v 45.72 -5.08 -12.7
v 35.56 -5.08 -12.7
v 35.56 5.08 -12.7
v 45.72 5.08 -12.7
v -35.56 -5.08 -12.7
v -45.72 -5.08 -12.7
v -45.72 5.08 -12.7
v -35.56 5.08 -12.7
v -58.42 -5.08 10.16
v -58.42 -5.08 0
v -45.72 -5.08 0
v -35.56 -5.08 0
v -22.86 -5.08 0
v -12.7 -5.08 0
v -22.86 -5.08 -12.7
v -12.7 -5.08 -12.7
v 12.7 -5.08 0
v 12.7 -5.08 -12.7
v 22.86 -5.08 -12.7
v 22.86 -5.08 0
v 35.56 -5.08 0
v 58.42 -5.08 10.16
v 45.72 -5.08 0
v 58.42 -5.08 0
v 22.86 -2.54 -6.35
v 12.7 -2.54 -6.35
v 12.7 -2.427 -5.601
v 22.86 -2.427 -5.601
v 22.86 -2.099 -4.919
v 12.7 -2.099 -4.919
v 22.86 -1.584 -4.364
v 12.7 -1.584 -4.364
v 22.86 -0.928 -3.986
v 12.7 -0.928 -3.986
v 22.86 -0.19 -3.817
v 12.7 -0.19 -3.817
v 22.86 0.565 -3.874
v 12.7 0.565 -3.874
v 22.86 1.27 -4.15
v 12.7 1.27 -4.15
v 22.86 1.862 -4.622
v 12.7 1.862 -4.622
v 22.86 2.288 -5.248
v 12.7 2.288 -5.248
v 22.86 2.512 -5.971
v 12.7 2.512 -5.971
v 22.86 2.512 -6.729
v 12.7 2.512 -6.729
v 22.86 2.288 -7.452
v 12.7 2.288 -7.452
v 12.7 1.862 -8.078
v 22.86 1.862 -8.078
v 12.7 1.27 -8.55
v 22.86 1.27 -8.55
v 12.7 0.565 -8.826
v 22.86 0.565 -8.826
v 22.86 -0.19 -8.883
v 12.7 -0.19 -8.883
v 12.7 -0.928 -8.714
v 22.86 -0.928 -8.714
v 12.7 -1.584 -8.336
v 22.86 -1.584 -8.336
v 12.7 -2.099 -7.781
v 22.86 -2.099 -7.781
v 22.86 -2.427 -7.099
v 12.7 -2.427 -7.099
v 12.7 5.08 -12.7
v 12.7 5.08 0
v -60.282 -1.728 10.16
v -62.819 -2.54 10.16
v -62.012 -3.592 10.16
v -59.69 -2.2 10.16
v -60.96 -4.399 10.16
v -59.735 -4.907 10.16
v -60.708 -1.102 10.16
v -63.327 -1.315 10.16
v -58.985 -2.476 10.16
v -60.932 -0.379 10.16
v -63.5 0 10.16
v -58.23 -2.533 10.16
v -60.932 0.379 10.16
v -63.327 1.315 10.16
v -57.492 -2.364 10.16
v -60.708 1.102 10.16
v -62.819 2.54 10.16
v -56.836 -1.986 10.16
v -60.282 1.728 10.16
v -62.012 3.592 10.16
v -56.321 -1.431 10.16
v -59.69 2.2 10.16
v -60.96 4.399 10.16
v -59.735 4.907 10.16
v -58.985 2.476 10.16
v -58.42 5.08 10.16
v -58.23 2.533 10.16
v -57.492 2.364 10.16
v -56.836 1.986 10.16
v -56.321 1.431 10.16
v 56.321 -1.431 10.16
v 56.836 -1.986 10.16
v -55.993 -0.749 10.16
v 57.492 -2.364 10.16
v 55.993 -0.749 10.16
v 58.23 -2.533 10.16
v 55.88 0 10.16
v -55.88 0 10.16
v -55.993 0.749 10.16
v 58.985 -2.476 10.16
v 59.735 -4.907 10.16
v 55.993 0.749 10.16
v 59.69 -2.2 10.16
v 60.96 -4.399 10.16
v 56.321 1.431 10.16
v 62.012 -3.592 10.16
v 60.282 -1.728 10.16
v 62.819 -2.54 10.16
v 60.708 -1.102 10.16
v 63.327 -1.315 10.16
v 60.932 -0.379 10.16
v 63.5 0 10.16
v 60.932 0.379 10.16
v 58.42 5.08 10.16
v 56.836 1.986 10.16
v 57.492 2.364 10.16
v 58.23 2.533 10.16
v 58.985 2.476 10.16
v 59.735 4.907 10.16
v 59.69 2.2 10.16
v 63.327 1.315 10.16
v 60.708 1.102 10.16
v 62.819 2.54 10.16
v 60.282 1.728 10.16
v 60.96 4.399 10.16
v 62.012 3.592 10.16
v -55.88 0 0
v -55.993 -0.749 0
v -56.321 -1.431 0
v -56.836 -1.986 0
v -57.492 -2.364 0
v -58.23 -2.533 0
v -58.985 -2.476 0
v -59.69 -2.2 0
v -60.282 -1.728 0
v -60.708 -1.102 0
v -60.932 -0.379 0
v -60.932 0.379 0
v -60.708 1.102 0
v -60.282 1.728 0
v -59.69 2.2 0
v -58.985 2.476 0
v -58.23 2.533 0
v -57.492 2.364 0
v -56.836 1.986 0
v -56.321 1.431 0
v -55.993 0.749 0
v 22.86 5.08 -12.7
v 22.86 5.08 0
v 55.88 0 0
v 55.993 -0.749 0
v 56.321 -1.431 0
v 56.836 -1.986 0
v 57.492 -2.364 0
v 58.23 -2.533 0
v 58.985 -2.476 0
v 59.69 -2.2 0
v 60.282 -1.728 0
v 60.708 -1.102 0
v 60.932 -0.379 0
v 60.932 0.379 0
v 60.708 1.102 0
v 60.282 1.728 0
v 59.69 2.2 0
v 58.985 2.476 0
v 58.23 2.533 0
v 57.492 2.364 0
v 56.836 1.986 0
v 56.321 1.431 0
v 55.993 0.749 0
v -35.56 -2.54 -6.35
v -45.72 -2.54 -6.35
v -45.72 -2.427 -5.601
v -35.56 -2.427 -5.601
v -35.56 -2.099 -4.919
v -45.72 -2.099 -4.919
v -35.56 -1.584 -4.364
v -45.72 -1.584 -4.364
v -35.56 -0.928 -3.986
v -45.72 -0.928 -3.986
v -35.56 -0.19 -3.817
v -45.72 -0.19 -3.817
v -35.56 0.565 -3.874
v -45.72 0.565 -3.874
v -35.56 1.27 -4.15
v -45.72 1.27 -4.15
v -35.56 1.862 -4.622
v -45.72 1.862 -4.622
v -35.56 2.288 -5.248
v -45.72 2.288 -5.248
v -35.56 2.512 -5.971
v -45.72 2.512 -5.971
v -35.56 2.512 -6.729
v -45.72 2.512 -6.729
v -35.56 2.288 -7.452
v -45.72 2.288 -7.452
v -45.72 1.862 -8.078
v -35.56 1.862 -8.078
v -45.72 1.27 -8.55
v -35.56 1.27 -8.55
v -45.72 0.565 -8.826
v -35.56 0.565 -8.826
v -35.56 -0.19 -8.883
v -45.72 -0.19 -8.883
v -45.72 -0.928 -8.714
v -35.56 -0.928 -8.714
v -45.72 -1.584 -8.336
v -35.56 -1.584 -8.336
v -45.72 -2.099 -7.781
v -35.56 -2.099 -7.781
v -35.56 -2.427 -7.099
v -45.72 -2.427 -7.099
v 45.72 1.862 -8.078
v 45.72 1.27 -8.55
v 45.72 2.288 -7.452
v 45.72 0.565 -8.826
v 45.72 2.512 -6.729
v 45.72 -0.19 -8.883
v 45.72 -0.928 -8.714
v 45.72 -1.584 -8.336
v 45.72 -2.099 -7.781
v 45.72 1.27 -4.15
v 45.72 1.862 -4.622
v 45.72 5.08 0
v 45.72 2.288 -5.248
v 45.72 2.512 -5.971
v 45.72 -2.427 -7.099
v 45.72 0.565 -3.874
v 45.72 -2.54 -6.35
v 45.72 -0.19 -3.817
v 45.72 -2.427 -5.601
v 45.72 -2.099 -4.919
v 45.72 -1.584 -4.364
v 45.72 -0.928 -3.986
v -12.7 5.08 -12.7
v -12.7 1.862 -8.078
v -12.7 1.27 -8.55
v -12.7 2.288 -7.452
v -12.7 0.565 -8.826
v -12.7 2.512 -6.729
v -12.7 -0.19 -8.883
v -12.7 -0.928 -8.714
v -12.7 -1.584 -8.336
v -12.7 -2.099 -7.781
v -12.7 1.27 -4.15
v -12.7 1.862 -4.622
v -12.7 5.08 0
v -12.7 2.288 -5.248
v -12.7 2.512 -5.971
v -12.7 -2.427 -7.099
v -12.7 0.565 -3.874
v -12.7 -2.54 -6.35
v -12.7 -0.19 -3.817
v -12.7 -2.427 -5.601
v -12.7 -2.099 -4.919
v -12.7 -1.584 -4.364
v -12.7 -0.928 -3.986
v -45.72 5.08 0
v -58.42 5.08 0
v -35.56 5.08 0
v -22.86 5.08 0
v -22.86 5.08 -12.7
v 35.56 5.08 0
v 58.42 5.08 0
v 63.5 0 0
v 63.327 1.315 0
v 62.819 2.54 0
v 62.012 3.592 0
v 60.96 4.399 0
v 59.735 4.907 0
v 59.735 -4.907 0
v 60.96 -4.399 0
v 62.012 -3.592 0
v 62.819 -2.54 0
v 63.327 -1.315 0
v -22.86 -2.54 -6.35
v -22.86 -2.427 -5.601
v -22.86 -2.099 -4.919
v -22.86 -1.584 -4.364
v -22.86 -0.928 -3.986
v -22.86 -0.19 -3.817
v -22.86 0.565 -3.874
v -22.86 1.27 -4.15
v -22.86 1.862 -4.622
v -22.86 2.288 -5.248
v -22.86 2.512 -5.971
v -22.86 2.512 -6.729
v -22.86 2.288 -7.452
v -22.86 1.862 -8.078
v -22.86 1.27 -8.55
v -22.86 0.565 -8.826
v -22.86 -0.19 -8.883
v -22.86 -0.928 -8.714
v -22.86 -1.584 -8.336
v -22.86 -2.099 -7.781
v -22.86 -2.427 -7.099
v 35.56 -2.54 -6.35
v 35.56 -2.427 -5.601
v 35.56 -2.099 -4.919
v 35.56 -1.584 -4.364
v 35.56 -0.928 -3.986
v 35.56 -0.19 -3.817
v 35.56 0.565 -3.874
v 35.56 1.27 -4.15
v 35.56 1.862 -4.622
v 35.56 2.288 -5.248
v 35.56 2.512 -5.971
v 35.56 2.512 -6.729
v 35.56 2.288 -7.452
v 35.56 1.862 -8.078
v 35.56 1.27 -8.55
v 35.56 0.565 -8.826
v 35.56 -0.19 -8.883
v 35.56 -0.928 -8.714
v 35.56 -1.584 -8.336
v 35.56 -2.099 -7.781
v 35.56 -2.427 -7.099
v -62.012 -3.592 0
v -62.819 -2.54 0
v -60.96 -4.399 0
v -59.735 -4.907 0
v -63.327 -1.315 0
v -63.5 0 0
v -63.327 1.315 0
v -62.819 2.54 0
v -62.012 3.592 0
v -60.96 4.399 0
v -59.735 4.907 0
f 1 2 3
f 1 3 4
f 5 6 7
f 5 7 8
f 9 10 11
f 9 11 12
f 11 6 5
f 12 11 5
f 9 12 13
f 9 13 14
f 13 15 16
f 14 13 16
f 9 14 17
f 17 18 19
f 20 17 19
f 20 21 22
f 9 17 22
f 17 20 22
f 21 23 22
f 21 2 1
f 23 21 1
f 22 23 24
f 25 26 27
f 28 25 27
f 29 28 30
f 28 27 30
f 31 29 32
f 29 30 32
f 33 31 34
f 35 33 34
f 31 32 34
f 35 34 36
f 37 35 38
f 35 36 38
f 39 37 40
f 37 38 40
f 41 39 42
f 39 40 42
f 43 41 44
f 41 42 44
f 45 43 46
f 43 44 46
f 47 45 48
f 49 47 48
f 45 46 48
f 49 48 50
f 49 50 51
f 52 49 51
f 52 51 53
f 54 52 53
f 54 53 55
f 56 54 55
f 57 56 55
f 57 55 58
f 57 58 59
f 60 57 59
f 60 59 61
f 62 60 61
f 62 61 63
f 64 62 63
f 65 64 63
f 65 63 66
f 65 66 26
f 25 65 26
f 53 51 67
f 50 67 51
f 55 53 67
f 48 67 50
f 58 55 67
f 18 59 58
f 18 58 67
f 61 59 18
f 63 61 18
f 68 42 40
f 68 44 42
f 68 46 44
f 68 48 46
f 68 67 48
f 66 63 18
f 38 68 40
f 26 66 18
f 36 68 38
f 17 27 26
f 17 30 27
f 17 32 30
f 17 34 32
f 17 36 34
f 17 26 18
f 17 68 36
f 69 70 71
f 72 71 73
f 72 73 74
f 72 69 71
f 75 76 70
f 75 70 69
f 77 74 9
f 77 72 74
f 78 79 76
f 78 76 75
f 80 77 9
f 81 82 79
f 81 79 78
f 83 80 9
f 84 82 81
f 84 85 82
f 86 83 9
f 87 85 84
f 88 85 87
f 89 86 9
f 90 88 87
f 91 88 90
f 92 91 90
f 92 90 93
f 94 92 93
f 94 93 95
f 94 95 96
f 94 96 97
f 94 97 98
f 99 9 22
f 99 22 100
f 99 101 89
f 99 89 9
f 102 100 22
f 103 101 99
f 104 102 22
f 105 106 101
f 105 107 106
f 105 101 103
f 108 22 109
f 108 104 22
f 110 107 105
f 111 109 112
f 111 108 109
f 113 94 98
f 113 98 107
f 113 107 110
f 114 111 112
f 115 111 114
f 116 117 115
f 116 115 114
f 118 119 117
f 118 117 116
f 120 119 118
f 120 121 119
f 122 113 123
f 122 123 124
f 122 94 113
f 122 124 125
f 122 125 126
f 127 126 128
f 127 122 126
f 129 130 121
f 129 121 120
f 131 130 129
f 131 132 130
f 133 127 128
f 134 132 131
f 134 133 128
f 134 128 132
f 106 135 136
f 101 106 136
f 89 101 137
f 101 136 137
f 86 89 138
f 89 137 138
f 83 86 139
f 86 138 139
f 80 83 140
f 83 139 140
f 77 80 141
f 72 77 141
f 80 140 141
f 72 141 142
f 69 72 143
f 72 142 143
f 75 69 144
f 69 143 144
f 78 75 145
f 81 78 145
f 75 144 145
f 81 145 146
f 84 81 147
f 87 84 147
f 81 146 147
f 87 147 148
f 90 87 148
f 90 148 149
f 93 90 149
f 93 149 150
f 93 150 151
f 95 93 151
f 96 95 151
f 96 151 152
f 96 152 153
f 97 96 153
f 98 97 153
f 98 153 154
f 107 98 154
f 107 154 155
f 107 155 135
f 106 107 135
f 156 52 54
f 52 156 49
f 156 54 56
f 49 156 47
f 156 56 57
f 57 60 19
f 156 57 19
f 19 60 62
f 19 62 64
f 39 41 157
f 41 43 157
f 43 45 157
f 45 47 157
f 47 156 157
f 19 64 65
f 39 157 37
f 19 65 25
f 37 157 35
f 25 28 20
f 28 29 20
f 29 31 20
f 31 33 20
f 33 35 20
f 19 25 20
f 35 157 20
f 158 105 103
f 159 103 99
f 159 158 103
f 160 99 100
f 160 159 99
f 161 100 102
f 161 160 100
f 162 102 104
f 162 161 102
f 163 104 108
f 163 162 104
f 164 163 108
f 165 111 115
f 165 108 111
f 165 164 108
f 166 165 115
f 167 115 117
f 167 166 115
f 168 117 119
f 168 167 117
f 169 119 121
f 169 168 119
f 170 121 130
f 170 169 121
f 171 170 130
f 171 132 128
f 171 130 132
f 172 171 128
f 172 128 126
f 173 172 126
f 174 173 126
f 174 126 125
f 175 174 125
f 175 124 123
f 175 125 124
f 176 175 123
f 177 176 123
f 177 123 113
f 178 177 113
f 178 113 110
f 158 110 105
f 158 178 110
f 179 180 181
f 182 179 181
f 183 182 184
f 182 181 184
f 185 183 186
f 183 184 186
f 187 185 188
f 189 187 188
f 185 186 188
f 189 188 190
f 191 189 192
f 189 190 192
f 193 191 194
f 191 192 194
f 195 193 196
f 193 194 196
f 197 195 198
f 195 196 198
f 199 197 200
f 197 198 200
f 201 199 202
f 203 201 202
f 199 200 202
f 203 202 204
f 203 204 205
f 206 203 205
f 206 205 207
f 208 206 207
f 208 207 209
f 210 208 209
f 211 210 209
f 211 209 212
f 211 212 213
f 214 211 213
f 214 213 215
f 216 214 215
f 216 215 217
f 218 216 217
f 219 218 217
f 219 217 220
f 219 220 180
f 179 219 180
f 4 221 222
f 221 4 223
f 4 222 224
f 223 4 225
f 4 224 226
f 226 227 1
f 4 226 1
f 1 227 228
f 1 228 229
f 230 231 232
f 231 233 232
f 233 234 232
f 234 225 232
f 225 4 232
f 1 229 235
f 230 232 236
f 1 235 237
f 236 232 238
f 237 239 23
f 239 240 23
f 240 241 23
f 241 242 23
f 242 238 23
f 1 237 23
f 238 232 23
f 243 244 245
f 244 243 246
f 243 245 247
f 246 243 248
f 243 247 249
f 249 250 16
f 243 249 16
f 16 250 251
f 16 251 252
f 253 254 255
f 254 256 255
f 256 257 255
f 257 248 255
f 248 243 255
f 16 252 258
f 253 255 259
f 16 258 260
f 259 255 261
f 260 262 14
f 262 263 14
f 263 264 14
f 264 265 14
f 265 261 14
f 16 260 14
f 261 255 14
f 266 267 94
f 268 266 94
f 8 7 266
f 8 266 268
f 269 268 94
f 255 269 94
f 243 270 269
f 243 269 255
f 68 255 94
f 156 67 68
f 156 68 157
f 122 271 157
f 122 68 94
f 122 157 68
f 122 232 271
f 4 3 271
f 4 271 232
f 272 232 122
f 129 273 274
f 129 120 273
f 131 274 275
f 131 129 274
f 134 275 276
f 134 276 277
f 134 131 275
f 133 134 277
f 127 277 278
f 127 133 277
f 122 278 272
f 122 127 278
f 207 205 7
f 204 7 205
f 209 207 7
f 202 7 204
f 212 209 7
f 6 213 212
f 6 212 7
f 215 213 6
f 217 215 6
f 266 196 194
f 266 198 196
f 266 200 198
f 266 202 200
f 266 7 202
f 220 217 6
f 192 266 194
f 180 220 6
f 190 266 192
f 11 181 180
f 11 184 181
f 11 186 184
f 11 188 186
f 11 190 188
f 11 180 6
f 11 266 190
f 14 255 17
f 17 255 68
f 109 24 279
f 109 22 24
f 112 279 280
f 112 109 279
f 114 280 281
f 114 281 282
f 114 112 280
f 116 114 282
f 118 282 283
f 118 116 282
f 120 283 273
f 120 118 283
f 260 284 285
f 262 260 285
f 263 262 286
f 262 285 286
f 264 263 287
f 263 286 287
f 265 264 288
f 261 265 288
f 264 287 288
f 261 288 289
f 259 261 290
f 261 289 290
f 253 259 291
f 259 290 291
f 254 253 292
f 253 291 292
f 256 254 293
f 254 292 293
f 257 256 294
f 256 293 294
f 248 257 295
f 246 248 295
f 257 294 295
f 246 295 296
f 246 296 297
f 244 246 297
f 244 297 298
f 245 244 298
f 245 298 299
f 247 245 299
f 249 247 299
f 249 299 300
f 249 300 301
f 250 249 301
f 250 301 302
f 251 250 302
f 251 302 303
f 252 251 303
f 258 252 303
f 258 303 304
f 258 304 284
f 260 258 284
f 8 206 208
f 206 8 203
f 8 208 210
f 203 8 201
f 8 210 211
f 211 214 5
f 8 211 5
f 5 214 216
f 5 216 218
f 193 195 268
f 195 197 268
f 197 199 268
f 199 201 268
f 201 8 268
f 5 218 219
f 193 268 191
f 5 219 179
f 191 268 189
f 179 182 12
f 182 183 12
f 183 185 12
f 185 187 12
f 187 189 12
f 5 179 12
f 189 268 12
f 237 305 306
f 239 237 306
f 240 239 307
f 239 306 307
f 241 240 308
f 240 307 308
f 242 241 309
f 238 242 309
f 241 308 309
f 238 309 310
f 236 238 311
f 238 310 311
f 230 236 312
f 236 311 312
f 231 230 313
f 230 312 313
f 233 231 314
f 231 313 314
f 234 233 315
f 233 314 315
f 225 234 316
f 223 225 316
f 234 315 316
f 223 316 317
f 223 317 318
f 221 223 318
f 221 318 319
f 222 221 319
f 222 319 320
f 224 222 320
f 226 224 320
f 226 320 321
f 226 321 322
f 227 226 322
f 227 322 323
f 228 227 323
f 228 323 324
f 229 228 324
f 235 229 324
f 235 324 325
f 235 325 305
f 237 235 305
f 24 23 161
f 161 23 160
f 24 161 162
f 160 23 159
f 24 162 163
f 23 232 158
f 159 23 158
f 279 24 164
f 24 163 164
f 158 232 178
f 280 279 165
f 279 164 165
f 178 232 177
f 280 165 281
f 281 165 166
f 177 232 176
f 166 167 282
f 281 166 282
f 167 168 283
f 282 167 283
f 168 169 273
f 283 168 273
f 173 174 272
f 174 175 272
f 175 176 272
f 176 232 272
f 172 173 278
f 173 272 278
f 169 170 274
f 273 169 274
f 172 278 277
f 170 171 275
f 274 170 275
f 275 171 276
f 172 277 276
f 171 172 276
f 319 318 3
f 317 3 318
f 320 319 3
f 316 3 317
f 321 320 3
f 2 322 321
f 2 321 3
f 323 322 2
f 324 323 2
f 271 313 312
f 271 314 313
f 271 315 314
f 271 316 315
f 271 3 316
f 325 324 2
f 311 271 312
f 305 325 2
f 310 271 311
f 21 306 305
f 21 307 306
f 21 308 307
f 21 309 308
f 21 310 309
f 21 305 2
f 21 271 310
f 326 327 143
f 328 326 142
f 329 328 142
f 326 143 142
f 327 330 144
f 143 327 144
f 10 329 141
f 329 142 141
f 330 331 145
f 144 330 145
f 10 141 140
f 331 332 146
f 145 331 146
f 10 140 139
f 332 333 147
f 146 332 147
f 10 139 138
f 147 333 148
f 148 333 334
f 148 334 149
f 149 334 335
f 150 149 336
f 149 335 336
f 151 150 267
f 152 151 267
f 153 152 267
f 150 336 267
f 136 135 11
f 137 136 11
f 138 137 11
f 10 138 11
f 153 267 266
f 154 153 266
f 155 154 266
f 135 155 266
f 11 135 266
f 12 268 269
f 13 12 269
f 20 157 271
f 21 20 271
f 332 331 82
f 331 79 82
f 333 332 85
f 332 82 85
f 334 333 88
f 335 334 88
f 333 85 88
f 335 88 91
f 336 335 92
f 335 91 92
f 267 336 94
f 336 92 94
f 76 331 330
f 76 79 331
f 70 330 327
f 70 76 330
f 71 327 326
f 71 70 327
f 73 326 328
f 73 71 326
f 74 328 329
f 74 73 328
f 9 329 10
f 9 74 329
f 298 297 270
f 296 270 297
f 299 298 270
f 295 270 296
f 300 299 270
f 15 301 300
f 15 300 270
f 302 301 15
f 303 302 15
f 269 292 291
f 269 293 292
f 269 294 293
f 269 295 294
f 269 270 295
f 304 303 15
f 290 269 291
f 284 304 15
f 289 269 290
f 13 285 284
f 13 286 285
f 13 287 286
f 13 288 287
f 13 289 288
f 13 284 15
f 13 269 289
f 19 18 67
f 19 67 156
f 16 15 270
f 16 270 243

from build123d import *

# Parameters (mm, degrees)
F0_W     = 127
F0_H     = 10.16
F1_DEPTH = 10.16
F2_R     = 5.07999
F3_R     = 2.54
F4_DEPTH = 25.4
F5_W     = 10.16
F5_H     = 10.16
F6_DEPTH = 12.7
F7_R     = 2.54
F8_DEPTH = 99.822


# Not quite as in the source:
# - a fillet or chamfer is up to 0.001 mm smaller than in the source, because OpenCascade refuses the exact size
# - a pattern or mirror of a feature is missing from the dataset's text; its kind, count and spacing are read off the source's solid


with BuildPart() as f1:
    # F0 (on Top) → F1 (new body)
    with BuildSketch(Plane.XY):
        Rectangle(F0_W, F0_H)
    extrude(amount=F1_DEPTH)

    # F2 (radius 5.08 in the source; OpenCascade refuses exactly that, so slightly less here)
    f2_edges = [f1.edges().sort_by_distance(p)[0] for p in [
        (-63.5, -5.08, 5.08),
        (-63.5, 5.08, 5.08),
        (63.5, -5.08, 5.08),
        (63.5, 5.08, 5.08),
    ]]
    fillet(f2_edges, radius=F2_R)

    # F3 (on face) → F4 (cut)
    with BuildSketch(Plane(origin=(0, 0, 0), x_dir=(1, 0, 0), z_dir=(0, 0, -1))):
        with Locations((-58.42, 0)):
            Circle(F3_R)
    f4 = extrude(amount=-F4_DEPTH, mode=Mode.SUBTRACT)

    # F4_copies: F4 across plane
    add(f4.mirror(Plane(origin=(0, 0, 0), x_dir=(0, 0, 1), z_dir=(1, 0, 0))), mode=Mode.SUBTRACT)

    # F5 (on face) → F6 (join)
    with BuildSketch(Plane(origin=(0, 0, 0), x_dir=(1, 0, 0), z_dir=(0, 0, -1))):
        with Locations((-40.64, 0)):
            Rectangle(F5_W, F5_H)
        with Locations((-17.78, 0)):
            Rectangle(F5_W, F5_H)
        with Locations((17.78, 0)):
            Rectangle(F5_W, F5_H)
        with Locations((40.64, 0)):
            Rectangle(F5_W, F5_H)
    extrude(amount=F6_DEPTH)

    # F7 (on face) → F8 (cut)
    with BuildSketch(Plane(origin=(-45.72, 0, 0), x_dir=(0, -1, 0), z_dir=(-1, 0, 0))):
        with Locations((0, -6.35)):
            Circle(F7_R)
    extrude(amount=-F8_DEPTH, mode=Mode.SUBTRACT)


solid = f1.part
